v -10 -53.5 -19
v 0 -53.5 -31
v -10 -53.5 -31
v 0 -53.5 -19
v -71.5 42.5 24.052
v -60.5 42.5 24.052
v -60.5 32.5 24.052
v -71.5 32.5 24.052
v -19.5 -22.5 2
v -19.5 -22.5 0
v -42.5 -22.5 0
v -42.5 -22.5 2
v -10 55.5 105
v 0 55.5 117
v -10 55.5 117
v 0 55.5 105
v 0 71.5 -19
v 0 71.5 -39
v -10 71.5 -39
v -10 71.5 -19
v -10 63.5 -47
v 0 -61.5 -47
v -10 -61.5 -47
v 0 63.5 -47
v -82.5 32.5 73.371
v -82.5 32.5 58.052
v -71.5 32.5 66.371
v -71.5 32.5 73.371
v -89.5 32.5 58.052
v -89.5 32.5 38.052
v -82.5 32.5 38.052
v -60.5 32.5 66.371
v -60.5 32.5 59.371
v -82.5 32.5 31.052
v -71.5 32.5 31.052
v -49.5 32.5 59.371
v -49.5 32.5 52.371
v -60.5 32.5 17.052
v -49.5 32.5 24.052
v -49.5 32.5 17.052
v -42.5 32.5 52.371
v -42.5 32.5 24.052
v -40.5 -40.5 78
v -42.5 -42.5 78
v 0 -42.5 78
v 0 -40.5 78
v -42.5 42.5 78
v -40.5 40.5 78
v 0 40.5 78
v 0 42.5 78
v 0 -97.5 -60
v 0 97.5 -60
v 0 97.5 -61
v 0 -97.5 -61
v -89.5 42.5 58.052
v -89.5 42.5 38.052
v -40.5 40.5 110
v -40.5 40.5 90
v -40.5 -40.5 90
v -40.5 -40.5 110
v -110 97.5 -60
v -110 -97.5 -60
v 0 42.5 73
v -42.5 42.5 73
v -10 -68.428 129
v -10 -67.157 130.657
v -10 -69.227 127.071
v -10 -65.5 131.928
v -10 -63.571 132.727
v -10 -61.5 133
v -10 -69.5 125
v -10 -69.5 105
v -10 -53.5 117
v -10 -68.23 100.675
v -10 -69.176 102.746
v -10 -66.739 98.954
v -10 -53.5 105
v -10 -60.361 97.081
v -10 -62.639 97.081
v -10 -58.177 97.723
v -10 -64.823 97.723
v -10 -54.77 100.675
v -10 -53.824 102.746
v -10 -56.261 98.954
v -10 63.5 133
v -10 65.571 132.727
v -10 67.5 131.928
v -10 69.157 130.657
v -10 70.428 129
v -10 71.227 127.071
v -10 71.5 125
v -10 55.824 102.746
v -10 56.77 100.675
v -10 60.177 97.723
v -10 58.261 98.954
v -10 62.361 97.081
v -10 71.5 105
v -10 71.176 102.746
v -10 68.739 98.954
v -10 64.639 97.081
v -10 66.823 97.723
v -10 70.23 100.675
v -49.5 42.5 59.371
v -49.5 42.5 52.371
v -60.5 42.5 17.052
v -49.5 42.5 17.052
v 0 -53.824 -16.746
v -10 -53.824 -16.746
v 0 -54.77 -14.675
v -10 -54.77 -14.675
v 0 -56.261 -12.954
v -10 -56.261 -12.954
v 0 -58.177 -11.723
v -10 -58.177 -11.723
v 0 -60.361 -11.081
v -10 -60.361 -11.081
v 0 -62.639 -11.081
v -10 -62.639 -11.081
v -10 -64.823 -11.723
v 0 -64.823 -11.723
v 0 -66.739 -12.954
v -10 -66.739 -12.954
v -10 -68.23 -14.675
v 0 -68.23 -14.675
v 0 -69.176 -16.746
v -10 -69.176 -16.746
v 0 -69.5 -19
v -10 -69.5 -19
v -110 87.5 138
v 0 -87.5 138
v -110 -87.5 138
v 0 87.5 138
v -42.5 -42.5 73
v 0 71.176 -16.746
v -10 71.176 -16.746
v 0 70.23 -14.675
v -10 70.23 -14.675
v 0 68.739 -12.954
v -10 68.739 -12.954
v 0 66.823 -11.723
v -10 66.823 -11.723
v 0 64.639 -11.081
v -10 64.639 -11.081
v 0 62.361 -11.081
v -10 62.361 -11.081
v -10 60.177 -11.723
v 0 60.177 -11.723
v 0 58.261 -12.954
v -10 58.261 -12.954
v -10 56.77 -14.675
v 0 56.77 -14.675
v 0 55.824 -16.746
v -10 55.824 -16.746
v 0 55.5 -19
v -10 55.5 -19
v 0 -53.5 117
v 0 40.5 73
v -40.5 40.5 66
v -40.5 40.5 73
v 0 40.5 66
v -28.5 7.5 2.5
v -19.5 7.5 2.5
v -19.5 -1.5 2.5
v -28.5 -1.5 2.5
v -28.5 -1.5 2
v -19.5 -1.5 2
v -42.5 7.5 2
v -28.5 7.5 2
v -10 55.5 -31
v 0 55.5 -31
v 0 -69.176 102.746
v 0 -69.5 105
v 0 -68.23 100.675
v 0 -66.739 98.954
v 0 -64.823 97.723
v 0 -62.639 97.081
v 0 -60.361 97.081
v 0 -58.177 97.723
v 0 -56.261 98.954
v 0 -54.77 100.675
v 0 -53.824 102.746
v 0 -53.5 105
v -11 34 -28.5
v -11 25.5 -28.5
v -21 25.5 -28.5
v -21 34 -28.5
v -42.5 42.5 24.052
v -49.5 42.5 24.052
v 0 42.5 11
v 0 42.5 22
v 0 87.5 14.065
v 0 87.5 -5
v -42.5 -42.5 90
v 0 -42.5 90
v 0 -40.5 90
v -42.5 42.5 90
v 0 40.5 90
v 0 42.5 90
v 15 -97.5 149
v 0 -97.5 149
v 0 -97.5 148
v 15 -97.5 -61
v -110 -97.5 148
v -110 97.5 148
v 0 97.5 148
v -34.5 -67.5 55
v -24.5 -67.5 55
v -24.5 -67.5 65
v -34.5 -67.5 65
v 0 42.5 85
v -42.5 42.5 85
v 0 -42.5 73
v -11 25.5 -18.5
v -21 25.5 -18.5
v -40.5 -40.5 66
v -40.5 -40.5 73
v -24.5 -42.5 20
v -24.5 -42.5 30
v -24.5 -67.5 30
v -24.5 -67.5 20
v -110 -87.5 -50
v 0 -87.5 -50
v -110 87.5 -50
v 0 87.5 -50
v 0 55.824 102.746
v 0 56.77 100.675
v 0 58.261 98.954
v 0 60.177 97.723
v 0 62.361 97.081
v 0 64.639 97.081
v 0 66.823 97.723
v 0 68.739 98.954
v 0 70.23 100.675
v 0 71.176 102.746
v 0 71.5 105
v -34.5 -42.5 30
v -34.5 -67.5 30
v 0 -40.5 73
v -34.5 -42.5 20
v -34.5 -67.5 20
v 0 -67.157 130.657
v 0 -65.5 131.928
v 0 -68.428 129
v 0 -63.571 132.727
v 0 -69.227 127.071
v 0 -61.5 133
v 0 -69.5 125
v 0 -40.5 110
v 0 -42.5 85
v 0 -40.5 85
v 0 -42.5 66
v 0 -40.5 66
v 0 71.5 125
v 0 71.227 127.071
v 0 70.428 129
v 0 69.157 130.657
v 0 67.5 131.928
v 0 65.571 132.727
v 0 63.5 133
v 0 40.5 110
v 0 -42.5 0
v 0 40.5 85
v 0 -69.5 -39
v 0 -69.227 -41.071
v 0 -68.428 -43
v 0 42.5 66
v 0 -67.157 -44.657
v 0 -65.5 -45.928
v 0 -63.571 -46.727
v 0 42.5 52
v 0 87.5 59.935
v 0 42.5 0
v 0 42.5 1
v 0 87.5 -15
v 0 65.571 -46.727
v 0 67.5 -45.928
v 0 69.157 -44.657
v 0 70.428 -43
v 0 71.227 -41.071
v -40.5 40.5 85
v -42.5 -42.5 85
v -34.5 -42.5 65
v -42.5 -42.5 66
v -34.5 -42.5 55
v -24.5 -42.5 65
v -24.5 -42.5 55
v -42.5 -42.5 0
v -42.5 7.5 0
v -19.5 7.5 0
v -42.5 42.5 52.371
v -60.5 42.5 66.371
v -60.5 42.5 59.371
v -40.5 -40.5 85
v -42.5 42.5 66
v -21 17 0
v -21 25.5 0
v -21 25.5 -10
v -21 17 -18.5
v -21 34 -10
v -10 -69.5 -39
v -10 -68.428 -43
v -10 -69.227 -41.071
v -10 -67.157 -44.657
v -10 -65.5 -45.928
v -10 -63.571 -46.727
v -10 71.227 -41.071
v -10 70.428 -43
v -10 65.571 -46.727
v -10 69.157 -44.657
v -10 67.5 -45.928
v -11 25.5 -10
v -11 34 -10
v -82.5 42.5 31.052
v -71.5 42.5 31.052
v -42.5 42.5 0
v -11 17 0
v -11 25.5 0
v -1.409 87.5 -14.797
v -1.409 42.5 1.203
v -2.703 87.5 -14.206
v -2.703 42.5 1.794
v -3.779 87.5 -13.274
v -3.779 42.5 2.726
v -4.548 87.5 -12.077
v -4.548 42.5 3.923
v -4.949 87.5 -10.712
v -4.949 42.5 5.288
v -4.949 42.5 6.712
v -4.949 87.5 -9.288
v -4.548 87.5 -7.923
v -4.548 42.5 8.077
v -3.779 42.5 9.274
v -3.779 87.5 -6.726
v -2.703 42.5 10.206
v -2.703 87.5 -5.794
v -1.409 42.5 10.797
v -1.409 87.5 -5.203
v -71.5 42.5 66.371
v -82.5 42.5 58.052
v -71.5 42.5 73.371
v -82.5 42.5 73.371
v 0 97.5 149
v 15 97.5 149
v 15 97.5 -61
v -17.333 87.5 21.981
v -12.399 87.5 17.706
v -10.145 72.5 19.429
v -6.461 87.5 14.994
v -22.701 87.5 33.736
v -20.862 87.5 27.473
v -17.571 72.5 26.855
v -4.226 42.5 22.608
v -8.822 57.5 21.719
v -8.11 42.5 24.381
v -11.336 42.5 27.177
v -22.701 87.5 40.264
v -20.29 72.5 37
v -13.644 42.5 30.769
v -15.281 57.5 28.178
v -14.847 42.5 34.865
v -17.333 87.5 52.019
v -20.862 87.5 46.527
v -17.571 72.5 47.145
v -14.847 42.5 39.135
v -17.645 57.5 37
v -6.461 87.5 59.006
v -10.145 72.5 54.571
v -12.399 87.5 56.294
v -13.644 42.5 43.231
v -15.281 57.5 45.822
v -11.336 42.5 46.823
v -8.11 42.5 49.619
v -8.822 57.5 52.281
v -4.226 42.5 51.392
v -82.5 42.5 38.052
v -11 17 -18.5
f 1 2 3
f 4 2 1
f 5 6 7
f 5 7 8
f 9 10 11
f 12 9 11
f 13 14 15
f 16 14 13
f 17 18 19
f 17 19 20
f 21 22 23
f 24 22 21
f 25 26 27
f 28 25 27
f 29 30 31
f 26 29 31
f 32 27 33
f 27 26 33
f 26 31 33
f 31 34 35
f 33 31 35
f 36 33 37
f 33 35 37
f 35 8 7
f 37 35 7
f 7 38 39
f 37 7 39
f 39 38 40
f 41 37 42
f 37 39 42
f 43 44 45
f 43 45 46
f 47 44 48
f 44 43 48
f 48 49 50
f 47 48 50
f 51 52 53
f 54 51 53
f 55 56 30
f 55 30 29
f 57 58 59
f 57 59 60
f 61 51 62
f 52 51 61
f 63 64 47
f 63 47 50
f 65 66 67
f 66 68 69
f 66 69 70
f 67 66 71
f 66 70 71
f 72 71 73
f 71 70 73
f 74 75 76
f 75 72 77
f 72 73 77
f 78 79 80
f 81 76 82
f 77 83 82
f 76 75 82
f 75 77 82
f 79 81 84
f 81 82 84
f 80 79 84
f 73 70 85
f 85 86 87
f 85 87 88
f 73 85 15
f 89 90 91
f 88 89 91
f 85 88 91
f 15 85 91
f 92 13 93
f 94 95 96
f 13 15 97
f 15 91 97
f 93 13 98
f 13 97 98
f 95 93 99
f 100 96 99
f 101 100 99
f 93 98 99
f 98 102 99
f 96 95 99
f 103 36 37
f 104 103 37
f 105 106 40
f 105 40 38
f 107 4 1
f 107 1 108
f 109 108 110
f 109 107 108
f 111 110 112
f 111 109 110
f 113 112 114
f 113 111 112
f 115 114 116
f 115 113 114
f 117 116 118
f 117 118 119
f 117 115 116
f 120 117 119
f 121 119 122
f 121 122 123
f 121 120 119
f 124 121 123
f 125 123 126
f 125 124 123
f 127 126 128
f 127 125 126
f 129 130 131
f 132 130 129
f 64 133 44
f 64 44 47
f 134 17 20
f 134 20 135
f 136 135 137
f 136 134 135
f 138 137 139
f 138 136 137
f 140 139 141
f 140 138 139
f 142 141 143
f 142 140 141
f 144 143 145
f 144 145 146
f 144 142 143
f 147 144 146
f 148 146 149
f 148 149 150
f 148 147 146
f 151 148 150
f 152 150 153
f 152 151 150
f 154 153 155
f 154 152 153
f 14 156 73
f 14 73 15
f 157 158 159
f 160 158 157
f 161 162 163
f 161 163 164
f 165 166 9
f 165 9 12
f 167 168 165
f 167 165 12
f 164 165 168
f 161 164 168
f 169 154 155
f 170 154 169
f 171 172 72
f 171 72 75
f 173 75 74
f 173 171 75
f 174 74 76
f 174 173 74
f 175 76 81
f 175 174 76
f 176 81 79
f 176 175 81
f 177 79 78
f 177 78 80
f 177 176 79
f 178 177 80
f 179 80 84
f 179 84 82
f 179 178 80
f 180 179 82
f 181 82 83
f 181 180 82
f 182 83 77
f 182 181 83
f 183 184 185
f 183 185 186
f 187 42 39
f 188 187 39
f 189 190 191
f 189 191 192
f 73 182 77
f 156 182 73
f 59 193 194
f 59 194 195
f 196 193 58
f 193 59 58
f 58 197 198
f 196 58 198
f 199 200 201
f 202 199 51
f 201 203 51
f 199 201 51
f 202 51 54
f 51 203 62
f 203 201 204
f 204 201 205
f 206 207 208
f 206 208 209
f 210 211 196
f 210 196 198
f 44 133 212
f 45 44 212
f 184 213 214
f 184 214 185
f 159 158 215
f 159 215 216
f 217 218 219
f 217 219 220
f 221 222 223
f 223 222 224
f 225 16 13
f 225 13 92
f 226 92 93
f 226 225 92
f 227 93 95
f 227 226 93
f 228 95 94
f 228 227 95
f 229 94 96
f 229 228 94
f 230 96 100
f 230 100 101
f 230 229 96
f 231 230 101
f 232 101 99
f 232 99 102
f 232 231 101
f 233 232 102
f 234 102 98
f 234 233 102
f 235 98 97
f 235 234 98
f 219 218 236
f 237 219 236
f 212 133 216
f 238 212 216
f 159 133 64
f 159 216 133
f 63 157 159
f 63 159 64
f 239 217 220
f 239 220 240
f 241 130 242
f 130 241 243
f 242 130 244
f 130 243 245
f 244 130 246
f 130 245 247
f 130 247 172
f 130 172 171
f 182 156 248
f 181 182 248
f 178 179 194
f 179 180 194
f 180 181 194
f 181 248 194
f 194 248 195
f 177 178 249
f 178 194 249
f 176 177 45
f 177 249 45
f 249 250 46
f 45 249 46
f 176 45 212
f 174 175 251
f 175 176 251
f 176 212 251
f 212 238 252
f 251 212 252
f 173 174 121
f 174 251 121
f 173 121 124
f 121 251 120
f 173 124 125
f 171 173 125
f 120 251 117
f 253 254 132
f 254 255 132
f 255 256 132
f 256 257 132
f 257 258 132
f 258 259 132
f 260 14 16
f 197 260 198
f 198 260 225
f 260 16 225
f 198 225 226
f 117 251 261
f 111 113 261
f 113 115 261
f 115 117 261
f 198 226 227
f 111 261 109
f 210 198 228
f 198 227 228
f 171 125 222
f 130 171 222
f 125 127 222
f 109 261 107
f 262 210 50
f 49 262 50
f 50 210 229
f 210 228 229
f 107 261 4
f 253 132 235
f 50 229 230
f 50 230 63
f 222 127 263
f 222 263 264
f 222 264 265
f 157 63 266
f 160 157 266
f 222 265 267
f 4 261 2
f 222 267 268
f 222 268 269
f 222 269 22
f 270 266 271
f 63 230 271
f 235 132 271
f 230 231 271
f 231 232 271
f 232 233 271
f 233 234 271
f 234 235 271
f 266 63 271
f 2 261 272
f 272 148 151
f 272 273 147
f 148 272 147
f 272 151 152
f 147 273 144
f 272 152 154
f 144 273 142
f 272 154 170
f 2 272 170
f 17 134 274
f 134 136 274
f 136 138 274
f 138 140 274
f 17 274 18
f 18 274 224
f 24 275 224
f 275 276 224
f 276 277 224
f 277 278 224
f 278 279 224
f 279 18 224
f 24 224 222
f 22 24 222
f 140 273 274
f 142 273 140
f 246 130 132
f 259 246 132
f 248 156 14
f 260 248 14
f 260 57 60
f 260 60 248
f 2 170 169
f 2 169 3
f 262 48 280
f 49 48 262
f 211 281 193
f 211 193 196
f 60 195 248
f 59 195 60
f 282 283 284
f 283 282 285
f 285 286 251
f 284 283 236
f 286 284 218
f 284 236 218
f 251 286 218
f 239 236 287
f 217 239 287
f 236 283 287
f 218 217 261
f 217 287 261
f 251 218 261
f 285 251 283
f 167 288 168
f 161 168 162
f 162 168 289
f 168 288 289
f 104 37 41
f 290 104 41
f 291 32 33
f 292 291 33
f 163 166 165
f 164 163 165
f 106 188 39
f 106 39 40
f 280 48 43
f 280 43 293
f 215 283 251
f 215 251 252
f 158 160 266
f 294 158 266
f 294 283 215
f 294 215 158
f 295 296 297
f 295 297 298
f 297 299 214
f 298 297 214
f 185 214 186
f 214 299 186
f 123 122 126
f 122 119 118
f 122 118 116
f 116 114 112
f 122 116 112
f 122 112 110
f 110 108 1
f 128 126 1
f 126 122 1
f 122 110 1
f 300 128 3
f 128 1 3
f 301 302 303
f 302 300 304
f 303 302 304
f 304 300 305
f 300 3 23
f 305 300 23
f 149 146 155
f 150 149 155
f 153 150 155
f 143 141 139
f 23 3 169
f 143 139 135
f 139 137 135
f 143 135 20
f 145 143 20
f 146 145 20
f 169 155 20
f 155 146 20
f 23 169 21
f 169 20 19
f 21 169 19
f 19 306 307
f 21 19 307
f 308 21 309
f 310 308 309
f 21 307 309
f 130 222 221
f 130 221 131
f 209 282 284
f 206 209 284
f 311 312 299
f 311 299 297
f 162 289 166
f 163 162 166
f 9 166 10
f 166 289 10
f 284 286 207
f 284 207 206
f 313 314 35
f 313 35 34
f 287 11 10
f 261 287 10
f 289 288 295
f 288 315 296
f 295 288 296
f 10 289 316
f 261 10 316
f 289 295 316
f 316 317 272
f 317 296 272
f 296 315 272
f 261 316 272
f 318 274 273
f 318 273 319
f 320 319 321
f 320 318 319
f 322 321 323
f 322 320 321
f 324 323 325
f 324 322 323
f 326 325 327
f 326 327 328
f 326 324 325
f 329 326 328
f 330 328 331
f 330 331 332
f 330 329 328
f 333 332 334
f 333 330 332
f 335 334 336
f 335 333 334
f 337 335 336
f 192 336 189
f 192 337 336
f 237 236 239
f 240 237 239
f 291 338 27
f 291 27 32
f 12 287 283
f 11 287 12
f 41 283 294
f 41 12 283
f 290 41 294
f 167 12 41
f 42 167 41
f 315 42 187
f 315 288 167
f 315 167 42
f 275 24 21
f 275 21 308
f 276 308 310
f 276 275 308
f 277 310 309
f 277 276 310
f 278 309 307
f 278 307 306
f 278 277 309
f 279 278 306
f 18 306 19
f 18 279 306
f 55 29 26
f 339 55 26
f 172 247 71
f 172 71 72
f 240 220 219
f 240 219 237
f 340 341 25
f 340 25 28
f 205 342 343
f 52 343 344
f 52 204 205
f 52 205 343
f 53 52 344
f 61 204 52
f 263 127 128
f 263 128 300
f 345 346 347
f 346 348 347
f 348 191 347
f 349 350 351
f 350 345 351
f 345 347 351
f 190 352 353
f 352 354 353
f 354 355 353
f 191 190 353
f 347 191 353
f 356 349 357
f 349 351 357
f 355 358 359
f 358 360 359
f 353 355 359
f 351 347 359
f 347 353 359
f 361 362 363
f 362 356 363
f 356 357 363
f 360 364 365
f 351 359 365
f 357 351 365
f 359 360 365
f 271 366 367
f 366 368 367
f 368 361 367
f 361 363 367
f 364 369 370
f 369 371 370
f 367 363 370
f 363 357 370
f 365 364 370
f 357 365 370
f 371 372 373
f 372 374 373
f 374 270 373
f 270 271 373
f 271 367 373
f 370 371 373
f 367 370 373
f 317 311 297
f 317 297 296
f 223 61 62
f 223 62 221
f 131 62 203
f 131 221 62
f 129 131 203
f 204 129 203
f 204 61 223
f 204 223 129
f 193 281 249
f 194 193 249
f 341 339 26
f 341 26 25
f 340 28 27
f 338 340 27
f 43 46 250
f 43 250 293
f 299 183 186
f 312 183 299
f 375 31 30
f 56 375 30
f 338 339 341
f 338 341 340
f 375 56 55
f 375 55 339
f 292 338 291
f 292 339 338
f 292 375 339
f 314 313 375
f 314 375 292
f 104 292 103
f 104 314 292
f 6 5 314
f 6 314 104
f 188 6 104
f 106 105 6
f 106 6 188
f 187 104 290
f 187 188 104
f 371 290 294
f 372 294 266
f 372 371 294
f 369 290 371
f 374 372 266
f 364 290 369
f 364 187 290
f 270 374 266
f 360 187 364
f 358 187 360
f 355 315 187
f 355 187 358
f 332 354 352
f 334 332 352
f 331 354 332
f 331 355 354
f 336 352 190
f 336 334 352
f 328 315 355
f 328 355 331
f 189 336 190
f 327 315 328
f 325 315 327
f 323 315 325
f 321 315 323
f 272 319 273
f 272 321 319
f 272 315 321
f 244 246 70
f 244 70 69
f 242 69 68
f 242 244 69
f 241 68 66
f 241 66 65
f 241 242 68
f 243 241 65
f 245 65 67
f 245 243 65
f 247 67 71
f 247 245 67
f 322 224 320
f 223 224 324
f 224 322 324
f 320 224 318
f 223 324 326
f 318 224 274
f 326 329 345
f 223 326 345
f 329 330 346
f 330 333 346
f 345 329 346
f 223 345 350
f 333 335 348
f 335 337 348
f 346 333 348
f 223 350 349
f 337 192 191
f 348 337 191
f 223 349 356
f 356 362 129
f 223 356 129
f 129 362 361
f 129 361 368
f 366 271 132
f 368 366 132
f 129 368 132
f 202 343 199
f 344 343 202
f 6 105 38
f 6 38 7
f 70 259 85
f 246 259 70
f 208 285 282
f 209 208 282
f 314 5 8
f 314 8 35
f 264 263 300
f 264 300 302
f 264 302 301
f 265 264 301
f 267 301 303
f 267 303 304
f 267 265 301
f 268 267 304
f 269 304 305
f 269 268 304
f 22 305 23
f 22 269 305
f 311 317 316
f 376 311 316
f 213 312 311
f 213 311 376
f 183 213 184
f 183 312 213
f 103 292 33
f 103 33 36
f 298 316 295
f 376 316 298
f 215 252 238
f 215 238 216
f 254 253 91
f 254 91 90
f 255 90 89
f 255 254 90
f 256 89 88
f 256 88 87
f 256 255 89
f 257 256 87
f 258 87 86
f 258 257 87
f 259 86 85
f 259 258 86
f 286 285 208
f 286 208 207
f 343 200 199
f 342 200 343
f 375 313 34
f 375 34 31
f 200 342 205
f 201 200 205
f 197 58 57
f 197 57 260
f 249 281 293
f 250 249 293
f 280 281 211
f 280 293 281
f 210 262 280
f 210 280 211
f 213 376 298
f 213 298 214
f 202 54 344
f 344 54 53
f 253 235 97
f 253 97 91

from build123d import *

# Parameters (mm, degrees)
CROQUIS2_W              = 85
CROQUIS2_H              = 85
SALIENTE_EXTRUIR1_DEPTH = 110
CROQUIS3_W              = 20
CROQUIS3_H              = 85
CROQUIS3_W_2            = 7
CORTAR_EXTRUIR1_DEPTH   = 2
CROQUIS5_W              = 83
CROQUIS5_H              = 20
CROQUIS5_H_2            = 7
CORTAR_EXTRUIR2_DEPTH   = 2
CROQUIS6_W              = 20
CROQUIS6_H              = 83
CROQUIS6_W_2            = 7
CORTAR_EXTRUIR3_DEPTH   = 2
CROQUIS7_W              = 81
CROQUIS7_H              = 20
CROQUIS7_H_2            = 7
CORTAR_EXTRUIR4_DEPTH   = 2
CORTAR_EXTRUIR6_DEPTH   = 2
CROQUIS12_W             = 9
CROQUIS12_H             = 9
CORTAR_EXTRUIR7_DEPTH   = 2.5
SALIENTE_EXTRUIR3_DEPTH = 10
SALIENTE_EXTRUIR4_DEPTH = 10
SALIENTE_EXTRUIR5_DEPTH = 10
CROQUIS20_W             = 10
CROQUIS20_H             = 10
SALIENTE_EXTRUIR6_DEPTH = 25
CROQUIS21_W             = 150.699966202
CROQUIS21_H             = 120.747177889
CORTAR_EXTRUIR9_DEPTH   = 112
CROQUIS22_W             = 210
CROQUIS22_H             = 195
SALIENTE_EXTRUIR7_DEPTH = 15
CROQUIS23_W             = 208
CROQUIS23_H             = 195
CROQUIS23_W_2           = 188
CROQUIS23_H_2           = 175
EXTRUIR_L_MINA1_DEPTH   = 110
SALIENTE_EXTRUIR8_REACH = 234.166
CROQUIS25_R             = 15
SALIENTE_EXTRUIR8_DRAFT = -10
CROQUIS26_R             = 5
SALIENTE_EXTRUIR9_DEPTH = 10


with BuildPart() as part:
    # Croquis2 → Saliente-Extruir1 (new body)
    with BuildSketch(Plane.XY):
        Rectangle(CROQUIS2_W, CROQUIS2_H)
    extrude(amount=SALIENTE_EXTRUIR1_DEPTH)

    # Croquis3 → Cortar-Extruir1 (cut)
    with BuildSketch(Plane.ZY.offset(42.5)):
        with Locations((100, 0)):
            Rectangle(CROQUIS3_W, CROQUIS3_H)
        with Locations((81.5, 0)):
            Rectangle(CROQUIS3_W_2, CROQUIS3_H)
        with Locations((69.5, 0)):
            Rectangle(CROQUIS3_W_2, CROQUIS3_H)
    extrude(amount=-CORTAR_EXTRUIR1_DEPTH, mode=Mode.SUBTRACT)

    # Croquis5 → Cortar-Extruir2 (cut)
    with BuildSketch(Plane(origin=(0, 42.5, 0), x_dir=(1, 0, 0), z_dir=(0, 1, 0))):
        with Locations((1, -100)):
            Rectangle(CROQUIS5_W, CROQUIS5_H)
        with Locations((1, -81.5)):
            Rectangle(CROQUIS5_W, CROQUIS5_H_2)
        with Locations((1, -69.5)):
            Rectangle(CROQUIS5_W, CROQUIS5_H_2)
    extrude(amount=-CORTAR_EXTRUIR2_DEPTH, mode=Mode.SUBTRACT)

    # Croquis6 → Cortar-Extruir3 (cut)
    with BuildSketch(Plane(origin=(42.5, 0, 0), x_dir=(0, 0, -1), z_dir=(1, 0, 0))):
        with Locations((-100, -1)):
            Rectangle(CROQUIS6_W, CROQUIS6_H)
        with Locations((-81.5, -1)):
            Rectangle(CROQUIS6_W_2, CROQUIS6_H)
        with Locations((-69.5, -1)):
            Rectangle(CROQUIS6_W_2, CROQUIS6_H)
    extrude(amount=-CORTAR_EXTRUIR3_DEPTH, mode=Mode.SUBTRACT)

    # Croquis7 → Cortar-Extruir4 (cut)
    with BuildSketch(Plane(origin=(0, -42.5, 0), x_dir=(-1, 0, 0), z_dir=(0, -1, 0))):
        with Locations((0, -100)):
            Rectangle(CROQUIS7_W, CROQUIS7_H)
        with Locations((0, -81.5)):
            Rectangle(CROQUIS7_W, CROQUIS7_H_2)
        with Locations((0, -69.5)):
            Rectangle(CROQUIS7_W, CROQUIS7_H_2)
    extrude(amount=-CORTAR_EXTRUIR4_DEPTH, mode=Mode.SUBTRACT)

    # Croquis8 → Cortar-Extruir6 (cut)
    with BuildSketch(Plane(origin=(0, 0, 0), x_dir=(-1, 0, 0), z_dir=(0, 0, -1))):
        Polygon((-19.5, -22.5), (-19.5, -1.5), (-28.5, -1.5), (-28.5, 7.5), (-42.5, 7.5), (-42.5, -22.5), align=None)
        Polygon((42.5, -22.5), (42.5, 7.5), (28.5, 7.5), (28.5, -1.5), (19.5, -1.5), (19.5, -22.5), align=None)
    extrude(amount=-CORTAR_EXTRUIR6_DEPTH, mode=Mode.SUBTRACT)

    # Croquis12 → Cortar-Extruir7 (cut)
    with BuildSketch(Plane(origin=(0, 0, 0), x_dir=(-1, 0, 0), z_dir=(0, 0, -1))):
        with Locations((-24, 3)):
            Rectangle(CROQUIS12_W, CROQUIS12_H)
        with Locations((24, 3)):
            Rectangle(CROQUIS12_W, CROQUIS12_H)
    extrude(amount=-CORTAR_EXTRUIR7_DEPTH, mode=Mode.SUBTRACT)

    # Croquis15 → Saliente-Extruir3 (add)
    with BuildSketch(Plane(origin=(-11, 0, 0), x_dir=(0, 0, -1), z_dir=(1, 0, 0))):
        Polygon((0, 17), (18.5, 17), (18.5, 25.5), (28.5, 25.5), (28.5, 34), (10, 34), (10, 25.5), (0, 25.5), align=None)
    extrude(amount=-SALIENTE_EXTRUIR3_DEPTH)

    # Croquis18 → Saliente-Extruir4 (add)
    with BuildSketch(Plane(origin=(11, 0, 0), x_dir=(0, 0, -1), z_dir=(1, 0, 0))):
        Polygon((18.5, 17), (18.5, 25.5), (28.5, 25.5), (28.5, 34), (10, 34), (10, 25.5), (0, 25.5), (0, 17), align=None)
    extrude(amount=SALIENTE_EXTRUIR4_DEPTH)

    # Croquis19 → Saliente-Extruir5 (add)
    with BuildSketch(Plane(origin=(0, 42.5, 0), x_dir=(1, 0, 0), z_dir=(0, 1, 0))):
        Polygon((60.5, -59.370690979), (49.5, -59.370690979), (49.5, -52.370690979), (42.5, -52.370690979), (42.5, -24.05242538), (49.5, -24.05242538), (49.5, -17.05242538), (60.5, -17.05242538), (60.5, -24.05242538), (71.5, -24.05242538), (71.5, -31.05242538), (82.5, -31.05242538), (82.5, -38.05242538), (89.5, -38.05242538), (89.5, -58.05242538), (82.5, -58.05242538), (82.5, -73.370690979), (71.5, -73.370690979), (71.5, -66.370690979), (60.5, -66.370690979), align=None)
        Polygon((-49.5, -17.05242538), (-60.5, -17.05242538), (-60.5, -24.05242538), (-71.5, -24.05242538), (-71.5, -31.05242538), (-82.5, -31.05242538), (-82.5, -38.05242538), (-89.5, -38.05242538), (-89.5, -58.05242538), (-82.5, -58.05242538), (-82.5, -73.370690979), (-71.5, -73.370690979), (-71.5, -66.370690979), (-60.5, -66.370690979), (-60.5, -59.370690979), (-49.5, -59.370690979), (-49.5, -52.370690979), (-42.5, -52.370690979), (-42.5, -24.05242538), (-49.5, -24.05242538), align=None)
    extrude(amount=-SALIENTE_EXTRUIR5_DEPTH)

    # Croquis20 → Saliente-Extruir6 (add)
    with BuildSketch(Plane(origin=(0, -42.5, 0), x_dir=(-1, 0, 0), z_dir=(0, -1, 0))):
        with Locations((-29.5, -25)):
            Rectangle(CROQUIS20_W, CROQUIS20_H)
        with Locations((29.5, -25)):
            Rectangle(CROQUIS20_W, CROQUIS20_H)
        with Locations((-29.5, -60)):
            Rectangle(CROQUIS20_W, CROQUIS20_H)
        with Locations((29.5, -60)):
            Rectangle(CROQUIS20_W, CROQUIS20_H)
    extrude(amount=SALIENTE_EXTRUIR6_DEPTH)

    # Croquis21 → Cortar-Extruir9 (cut)
    with BuildSketch(Plane(origin=(0, 0, 0), x_dir=(0, 0, -1), z_dir=(1, 0, 0))):
        with Locations((-39.284674443, -15.603112065)):
            Rectangle(CROQUIS21_W, CROQUIS21_H)
    extrude(amount=CORTAR_EXTRUIR9_DEPTH, mode=Mode.SUBTRACT)

    # Croquis22 → Saliente-Extruir7 (add)
    with BuildSketch(Plane(origin=(0, 0, 0), x_dir=(0, 0, -1), z_dir=(1, 0, 0))):
        with Locations((-44, 0)):
            Rectangle(CROQUIS22_W, CROQUIS22_H)
    extrude(amount=SALIENTE_EXTRUIR7_DEPTH)

    # Croquis23 → Extruir-Lámina1 (add)
    with BuildSketch(Plane.ZY):
        with Locations((44, 0)):
            Rectangle(CROQUIS23_W, CROQUIS23_H)
        with Locations((44, 0)):
            Rectangle(CROQUIS23_W_2, CROQUIS23_H_2, mode=Mode.SUBTRACT)
    extrude(amount=EXTRUIR_L_MINA1_DEPTH)




with BuildPart() as saliente_extruir8_long_prism_1:
    # Croquis25 → Saliente-Extruir8 (the long prism of profile 1, to be tilted and cut off)
    with BuildSketch(Plane(origin=(0, 42.5, 0), x_dir=(1, 0, 0), z_dir=(0, 1, 0))):
        with Locations((0, -37)):
            Circle(CROQUIS25_R)
    extrude(amount=SALIENTE_EXTRUIR8_REACH)
    saliente_extruir8_tool1_sides = [saliente_extruir8_long_prism_1.faces().sort_by_distance(p)[0] for p in [
        (-15, 159.583, 37),
    ]]
    draft(saliente_extruir8_tool1_sides, Plane(origin=(0, 42.5, 0), x_dir=(1, 0, 0), z_dir=(0, 1, 0)), SALIENTE_EXTRUIR8_DRAFT)  # the draft: side faces tilted about the start plane


with BuildPart() as part_1:
    add(part.part)
    saliente_extruir8_tool1 = saliente_extruir8_long_prism_1.part - part.part
    add(saliente_extruir8_tool1.solids().sort_by_distance((0, 42.5, 37))[0])

    # Barrer2: sweep along a path in Croquis35
    with BuildLine(Plane(origin=(0, 0, 0), x_dir=(0, 0, -1), z_dir=(1, 0, 0))) as barrer2_path:
        Line((-6, 42.5), (10, 87.5))
    # Croquis26 → Barrer2 (sweep)
    with BuildSketch(Plane(origin=(0, 42.5, 0), x_dir=(1, 0, 0), z_dir=(0, 1, 0))):
        with Locations((0, -6)):
            Circle(CROQUIS26_R)
    sweep(path=barrer2_path.line)

    # Croquis37 → Saliente-Extruir9 (add)
    with BuildSketch(Plane.ZY):
        with BuildLine():
            Line((105, -53.5), (117, -53.5))
            Line((117, -53.5), (117, 55.5))
            Line((117, 55.5), (105, 55.5))
            ThreePointArc((105, 55.5), (97, 63.5), (105, 71.5))
            Line((105, 71.5), (125, 71.5))
            ThreePointArc((125, 71.5), (130.656854249, 69.156854249), (133, 63.5))
            Line((133, 63.5), (133, -61.5))
            ThreePointArc((133, -61.5), (130.656854249, -67.156854249), (125, -69.5))
            Line((125, -69.5), (105, -69.5))
            ThreePointArc((105, -69.5), (97, -61.5), (105, -53.5))
        make_face()
        with BuildLine():
            ThreePointArc((-47, 63.5), (-44.656854249, 69.156854249), (-39, 71.5))
            Line((-39, 71.5), (-19, 71.5))
            ThreePointArc((-19, 71.5), (-11, 63.5), (-19, 55.5))
            Line((-19, 55.5), (-31, 55.5))
            Line((-31, 55.5), (-31, -53.5))
            Line((-31, -53.5), (-19, -53.5))
            ThreePointArc((-19, -53.5), (-11, -61.5), (-19, -69.5))
            Line((-19, -69.5), (-39, -69.5))
            ThreePointArc((-39, -69.5), (-44.656854249, -67.156854249), (-47, -61.5))
            Line((-47, -61.5), (-47, 63.5))
        make_face()
    extrude(amount=SALIENTE_EXTRUIR9_DEPTH)


solid = part_1.part
